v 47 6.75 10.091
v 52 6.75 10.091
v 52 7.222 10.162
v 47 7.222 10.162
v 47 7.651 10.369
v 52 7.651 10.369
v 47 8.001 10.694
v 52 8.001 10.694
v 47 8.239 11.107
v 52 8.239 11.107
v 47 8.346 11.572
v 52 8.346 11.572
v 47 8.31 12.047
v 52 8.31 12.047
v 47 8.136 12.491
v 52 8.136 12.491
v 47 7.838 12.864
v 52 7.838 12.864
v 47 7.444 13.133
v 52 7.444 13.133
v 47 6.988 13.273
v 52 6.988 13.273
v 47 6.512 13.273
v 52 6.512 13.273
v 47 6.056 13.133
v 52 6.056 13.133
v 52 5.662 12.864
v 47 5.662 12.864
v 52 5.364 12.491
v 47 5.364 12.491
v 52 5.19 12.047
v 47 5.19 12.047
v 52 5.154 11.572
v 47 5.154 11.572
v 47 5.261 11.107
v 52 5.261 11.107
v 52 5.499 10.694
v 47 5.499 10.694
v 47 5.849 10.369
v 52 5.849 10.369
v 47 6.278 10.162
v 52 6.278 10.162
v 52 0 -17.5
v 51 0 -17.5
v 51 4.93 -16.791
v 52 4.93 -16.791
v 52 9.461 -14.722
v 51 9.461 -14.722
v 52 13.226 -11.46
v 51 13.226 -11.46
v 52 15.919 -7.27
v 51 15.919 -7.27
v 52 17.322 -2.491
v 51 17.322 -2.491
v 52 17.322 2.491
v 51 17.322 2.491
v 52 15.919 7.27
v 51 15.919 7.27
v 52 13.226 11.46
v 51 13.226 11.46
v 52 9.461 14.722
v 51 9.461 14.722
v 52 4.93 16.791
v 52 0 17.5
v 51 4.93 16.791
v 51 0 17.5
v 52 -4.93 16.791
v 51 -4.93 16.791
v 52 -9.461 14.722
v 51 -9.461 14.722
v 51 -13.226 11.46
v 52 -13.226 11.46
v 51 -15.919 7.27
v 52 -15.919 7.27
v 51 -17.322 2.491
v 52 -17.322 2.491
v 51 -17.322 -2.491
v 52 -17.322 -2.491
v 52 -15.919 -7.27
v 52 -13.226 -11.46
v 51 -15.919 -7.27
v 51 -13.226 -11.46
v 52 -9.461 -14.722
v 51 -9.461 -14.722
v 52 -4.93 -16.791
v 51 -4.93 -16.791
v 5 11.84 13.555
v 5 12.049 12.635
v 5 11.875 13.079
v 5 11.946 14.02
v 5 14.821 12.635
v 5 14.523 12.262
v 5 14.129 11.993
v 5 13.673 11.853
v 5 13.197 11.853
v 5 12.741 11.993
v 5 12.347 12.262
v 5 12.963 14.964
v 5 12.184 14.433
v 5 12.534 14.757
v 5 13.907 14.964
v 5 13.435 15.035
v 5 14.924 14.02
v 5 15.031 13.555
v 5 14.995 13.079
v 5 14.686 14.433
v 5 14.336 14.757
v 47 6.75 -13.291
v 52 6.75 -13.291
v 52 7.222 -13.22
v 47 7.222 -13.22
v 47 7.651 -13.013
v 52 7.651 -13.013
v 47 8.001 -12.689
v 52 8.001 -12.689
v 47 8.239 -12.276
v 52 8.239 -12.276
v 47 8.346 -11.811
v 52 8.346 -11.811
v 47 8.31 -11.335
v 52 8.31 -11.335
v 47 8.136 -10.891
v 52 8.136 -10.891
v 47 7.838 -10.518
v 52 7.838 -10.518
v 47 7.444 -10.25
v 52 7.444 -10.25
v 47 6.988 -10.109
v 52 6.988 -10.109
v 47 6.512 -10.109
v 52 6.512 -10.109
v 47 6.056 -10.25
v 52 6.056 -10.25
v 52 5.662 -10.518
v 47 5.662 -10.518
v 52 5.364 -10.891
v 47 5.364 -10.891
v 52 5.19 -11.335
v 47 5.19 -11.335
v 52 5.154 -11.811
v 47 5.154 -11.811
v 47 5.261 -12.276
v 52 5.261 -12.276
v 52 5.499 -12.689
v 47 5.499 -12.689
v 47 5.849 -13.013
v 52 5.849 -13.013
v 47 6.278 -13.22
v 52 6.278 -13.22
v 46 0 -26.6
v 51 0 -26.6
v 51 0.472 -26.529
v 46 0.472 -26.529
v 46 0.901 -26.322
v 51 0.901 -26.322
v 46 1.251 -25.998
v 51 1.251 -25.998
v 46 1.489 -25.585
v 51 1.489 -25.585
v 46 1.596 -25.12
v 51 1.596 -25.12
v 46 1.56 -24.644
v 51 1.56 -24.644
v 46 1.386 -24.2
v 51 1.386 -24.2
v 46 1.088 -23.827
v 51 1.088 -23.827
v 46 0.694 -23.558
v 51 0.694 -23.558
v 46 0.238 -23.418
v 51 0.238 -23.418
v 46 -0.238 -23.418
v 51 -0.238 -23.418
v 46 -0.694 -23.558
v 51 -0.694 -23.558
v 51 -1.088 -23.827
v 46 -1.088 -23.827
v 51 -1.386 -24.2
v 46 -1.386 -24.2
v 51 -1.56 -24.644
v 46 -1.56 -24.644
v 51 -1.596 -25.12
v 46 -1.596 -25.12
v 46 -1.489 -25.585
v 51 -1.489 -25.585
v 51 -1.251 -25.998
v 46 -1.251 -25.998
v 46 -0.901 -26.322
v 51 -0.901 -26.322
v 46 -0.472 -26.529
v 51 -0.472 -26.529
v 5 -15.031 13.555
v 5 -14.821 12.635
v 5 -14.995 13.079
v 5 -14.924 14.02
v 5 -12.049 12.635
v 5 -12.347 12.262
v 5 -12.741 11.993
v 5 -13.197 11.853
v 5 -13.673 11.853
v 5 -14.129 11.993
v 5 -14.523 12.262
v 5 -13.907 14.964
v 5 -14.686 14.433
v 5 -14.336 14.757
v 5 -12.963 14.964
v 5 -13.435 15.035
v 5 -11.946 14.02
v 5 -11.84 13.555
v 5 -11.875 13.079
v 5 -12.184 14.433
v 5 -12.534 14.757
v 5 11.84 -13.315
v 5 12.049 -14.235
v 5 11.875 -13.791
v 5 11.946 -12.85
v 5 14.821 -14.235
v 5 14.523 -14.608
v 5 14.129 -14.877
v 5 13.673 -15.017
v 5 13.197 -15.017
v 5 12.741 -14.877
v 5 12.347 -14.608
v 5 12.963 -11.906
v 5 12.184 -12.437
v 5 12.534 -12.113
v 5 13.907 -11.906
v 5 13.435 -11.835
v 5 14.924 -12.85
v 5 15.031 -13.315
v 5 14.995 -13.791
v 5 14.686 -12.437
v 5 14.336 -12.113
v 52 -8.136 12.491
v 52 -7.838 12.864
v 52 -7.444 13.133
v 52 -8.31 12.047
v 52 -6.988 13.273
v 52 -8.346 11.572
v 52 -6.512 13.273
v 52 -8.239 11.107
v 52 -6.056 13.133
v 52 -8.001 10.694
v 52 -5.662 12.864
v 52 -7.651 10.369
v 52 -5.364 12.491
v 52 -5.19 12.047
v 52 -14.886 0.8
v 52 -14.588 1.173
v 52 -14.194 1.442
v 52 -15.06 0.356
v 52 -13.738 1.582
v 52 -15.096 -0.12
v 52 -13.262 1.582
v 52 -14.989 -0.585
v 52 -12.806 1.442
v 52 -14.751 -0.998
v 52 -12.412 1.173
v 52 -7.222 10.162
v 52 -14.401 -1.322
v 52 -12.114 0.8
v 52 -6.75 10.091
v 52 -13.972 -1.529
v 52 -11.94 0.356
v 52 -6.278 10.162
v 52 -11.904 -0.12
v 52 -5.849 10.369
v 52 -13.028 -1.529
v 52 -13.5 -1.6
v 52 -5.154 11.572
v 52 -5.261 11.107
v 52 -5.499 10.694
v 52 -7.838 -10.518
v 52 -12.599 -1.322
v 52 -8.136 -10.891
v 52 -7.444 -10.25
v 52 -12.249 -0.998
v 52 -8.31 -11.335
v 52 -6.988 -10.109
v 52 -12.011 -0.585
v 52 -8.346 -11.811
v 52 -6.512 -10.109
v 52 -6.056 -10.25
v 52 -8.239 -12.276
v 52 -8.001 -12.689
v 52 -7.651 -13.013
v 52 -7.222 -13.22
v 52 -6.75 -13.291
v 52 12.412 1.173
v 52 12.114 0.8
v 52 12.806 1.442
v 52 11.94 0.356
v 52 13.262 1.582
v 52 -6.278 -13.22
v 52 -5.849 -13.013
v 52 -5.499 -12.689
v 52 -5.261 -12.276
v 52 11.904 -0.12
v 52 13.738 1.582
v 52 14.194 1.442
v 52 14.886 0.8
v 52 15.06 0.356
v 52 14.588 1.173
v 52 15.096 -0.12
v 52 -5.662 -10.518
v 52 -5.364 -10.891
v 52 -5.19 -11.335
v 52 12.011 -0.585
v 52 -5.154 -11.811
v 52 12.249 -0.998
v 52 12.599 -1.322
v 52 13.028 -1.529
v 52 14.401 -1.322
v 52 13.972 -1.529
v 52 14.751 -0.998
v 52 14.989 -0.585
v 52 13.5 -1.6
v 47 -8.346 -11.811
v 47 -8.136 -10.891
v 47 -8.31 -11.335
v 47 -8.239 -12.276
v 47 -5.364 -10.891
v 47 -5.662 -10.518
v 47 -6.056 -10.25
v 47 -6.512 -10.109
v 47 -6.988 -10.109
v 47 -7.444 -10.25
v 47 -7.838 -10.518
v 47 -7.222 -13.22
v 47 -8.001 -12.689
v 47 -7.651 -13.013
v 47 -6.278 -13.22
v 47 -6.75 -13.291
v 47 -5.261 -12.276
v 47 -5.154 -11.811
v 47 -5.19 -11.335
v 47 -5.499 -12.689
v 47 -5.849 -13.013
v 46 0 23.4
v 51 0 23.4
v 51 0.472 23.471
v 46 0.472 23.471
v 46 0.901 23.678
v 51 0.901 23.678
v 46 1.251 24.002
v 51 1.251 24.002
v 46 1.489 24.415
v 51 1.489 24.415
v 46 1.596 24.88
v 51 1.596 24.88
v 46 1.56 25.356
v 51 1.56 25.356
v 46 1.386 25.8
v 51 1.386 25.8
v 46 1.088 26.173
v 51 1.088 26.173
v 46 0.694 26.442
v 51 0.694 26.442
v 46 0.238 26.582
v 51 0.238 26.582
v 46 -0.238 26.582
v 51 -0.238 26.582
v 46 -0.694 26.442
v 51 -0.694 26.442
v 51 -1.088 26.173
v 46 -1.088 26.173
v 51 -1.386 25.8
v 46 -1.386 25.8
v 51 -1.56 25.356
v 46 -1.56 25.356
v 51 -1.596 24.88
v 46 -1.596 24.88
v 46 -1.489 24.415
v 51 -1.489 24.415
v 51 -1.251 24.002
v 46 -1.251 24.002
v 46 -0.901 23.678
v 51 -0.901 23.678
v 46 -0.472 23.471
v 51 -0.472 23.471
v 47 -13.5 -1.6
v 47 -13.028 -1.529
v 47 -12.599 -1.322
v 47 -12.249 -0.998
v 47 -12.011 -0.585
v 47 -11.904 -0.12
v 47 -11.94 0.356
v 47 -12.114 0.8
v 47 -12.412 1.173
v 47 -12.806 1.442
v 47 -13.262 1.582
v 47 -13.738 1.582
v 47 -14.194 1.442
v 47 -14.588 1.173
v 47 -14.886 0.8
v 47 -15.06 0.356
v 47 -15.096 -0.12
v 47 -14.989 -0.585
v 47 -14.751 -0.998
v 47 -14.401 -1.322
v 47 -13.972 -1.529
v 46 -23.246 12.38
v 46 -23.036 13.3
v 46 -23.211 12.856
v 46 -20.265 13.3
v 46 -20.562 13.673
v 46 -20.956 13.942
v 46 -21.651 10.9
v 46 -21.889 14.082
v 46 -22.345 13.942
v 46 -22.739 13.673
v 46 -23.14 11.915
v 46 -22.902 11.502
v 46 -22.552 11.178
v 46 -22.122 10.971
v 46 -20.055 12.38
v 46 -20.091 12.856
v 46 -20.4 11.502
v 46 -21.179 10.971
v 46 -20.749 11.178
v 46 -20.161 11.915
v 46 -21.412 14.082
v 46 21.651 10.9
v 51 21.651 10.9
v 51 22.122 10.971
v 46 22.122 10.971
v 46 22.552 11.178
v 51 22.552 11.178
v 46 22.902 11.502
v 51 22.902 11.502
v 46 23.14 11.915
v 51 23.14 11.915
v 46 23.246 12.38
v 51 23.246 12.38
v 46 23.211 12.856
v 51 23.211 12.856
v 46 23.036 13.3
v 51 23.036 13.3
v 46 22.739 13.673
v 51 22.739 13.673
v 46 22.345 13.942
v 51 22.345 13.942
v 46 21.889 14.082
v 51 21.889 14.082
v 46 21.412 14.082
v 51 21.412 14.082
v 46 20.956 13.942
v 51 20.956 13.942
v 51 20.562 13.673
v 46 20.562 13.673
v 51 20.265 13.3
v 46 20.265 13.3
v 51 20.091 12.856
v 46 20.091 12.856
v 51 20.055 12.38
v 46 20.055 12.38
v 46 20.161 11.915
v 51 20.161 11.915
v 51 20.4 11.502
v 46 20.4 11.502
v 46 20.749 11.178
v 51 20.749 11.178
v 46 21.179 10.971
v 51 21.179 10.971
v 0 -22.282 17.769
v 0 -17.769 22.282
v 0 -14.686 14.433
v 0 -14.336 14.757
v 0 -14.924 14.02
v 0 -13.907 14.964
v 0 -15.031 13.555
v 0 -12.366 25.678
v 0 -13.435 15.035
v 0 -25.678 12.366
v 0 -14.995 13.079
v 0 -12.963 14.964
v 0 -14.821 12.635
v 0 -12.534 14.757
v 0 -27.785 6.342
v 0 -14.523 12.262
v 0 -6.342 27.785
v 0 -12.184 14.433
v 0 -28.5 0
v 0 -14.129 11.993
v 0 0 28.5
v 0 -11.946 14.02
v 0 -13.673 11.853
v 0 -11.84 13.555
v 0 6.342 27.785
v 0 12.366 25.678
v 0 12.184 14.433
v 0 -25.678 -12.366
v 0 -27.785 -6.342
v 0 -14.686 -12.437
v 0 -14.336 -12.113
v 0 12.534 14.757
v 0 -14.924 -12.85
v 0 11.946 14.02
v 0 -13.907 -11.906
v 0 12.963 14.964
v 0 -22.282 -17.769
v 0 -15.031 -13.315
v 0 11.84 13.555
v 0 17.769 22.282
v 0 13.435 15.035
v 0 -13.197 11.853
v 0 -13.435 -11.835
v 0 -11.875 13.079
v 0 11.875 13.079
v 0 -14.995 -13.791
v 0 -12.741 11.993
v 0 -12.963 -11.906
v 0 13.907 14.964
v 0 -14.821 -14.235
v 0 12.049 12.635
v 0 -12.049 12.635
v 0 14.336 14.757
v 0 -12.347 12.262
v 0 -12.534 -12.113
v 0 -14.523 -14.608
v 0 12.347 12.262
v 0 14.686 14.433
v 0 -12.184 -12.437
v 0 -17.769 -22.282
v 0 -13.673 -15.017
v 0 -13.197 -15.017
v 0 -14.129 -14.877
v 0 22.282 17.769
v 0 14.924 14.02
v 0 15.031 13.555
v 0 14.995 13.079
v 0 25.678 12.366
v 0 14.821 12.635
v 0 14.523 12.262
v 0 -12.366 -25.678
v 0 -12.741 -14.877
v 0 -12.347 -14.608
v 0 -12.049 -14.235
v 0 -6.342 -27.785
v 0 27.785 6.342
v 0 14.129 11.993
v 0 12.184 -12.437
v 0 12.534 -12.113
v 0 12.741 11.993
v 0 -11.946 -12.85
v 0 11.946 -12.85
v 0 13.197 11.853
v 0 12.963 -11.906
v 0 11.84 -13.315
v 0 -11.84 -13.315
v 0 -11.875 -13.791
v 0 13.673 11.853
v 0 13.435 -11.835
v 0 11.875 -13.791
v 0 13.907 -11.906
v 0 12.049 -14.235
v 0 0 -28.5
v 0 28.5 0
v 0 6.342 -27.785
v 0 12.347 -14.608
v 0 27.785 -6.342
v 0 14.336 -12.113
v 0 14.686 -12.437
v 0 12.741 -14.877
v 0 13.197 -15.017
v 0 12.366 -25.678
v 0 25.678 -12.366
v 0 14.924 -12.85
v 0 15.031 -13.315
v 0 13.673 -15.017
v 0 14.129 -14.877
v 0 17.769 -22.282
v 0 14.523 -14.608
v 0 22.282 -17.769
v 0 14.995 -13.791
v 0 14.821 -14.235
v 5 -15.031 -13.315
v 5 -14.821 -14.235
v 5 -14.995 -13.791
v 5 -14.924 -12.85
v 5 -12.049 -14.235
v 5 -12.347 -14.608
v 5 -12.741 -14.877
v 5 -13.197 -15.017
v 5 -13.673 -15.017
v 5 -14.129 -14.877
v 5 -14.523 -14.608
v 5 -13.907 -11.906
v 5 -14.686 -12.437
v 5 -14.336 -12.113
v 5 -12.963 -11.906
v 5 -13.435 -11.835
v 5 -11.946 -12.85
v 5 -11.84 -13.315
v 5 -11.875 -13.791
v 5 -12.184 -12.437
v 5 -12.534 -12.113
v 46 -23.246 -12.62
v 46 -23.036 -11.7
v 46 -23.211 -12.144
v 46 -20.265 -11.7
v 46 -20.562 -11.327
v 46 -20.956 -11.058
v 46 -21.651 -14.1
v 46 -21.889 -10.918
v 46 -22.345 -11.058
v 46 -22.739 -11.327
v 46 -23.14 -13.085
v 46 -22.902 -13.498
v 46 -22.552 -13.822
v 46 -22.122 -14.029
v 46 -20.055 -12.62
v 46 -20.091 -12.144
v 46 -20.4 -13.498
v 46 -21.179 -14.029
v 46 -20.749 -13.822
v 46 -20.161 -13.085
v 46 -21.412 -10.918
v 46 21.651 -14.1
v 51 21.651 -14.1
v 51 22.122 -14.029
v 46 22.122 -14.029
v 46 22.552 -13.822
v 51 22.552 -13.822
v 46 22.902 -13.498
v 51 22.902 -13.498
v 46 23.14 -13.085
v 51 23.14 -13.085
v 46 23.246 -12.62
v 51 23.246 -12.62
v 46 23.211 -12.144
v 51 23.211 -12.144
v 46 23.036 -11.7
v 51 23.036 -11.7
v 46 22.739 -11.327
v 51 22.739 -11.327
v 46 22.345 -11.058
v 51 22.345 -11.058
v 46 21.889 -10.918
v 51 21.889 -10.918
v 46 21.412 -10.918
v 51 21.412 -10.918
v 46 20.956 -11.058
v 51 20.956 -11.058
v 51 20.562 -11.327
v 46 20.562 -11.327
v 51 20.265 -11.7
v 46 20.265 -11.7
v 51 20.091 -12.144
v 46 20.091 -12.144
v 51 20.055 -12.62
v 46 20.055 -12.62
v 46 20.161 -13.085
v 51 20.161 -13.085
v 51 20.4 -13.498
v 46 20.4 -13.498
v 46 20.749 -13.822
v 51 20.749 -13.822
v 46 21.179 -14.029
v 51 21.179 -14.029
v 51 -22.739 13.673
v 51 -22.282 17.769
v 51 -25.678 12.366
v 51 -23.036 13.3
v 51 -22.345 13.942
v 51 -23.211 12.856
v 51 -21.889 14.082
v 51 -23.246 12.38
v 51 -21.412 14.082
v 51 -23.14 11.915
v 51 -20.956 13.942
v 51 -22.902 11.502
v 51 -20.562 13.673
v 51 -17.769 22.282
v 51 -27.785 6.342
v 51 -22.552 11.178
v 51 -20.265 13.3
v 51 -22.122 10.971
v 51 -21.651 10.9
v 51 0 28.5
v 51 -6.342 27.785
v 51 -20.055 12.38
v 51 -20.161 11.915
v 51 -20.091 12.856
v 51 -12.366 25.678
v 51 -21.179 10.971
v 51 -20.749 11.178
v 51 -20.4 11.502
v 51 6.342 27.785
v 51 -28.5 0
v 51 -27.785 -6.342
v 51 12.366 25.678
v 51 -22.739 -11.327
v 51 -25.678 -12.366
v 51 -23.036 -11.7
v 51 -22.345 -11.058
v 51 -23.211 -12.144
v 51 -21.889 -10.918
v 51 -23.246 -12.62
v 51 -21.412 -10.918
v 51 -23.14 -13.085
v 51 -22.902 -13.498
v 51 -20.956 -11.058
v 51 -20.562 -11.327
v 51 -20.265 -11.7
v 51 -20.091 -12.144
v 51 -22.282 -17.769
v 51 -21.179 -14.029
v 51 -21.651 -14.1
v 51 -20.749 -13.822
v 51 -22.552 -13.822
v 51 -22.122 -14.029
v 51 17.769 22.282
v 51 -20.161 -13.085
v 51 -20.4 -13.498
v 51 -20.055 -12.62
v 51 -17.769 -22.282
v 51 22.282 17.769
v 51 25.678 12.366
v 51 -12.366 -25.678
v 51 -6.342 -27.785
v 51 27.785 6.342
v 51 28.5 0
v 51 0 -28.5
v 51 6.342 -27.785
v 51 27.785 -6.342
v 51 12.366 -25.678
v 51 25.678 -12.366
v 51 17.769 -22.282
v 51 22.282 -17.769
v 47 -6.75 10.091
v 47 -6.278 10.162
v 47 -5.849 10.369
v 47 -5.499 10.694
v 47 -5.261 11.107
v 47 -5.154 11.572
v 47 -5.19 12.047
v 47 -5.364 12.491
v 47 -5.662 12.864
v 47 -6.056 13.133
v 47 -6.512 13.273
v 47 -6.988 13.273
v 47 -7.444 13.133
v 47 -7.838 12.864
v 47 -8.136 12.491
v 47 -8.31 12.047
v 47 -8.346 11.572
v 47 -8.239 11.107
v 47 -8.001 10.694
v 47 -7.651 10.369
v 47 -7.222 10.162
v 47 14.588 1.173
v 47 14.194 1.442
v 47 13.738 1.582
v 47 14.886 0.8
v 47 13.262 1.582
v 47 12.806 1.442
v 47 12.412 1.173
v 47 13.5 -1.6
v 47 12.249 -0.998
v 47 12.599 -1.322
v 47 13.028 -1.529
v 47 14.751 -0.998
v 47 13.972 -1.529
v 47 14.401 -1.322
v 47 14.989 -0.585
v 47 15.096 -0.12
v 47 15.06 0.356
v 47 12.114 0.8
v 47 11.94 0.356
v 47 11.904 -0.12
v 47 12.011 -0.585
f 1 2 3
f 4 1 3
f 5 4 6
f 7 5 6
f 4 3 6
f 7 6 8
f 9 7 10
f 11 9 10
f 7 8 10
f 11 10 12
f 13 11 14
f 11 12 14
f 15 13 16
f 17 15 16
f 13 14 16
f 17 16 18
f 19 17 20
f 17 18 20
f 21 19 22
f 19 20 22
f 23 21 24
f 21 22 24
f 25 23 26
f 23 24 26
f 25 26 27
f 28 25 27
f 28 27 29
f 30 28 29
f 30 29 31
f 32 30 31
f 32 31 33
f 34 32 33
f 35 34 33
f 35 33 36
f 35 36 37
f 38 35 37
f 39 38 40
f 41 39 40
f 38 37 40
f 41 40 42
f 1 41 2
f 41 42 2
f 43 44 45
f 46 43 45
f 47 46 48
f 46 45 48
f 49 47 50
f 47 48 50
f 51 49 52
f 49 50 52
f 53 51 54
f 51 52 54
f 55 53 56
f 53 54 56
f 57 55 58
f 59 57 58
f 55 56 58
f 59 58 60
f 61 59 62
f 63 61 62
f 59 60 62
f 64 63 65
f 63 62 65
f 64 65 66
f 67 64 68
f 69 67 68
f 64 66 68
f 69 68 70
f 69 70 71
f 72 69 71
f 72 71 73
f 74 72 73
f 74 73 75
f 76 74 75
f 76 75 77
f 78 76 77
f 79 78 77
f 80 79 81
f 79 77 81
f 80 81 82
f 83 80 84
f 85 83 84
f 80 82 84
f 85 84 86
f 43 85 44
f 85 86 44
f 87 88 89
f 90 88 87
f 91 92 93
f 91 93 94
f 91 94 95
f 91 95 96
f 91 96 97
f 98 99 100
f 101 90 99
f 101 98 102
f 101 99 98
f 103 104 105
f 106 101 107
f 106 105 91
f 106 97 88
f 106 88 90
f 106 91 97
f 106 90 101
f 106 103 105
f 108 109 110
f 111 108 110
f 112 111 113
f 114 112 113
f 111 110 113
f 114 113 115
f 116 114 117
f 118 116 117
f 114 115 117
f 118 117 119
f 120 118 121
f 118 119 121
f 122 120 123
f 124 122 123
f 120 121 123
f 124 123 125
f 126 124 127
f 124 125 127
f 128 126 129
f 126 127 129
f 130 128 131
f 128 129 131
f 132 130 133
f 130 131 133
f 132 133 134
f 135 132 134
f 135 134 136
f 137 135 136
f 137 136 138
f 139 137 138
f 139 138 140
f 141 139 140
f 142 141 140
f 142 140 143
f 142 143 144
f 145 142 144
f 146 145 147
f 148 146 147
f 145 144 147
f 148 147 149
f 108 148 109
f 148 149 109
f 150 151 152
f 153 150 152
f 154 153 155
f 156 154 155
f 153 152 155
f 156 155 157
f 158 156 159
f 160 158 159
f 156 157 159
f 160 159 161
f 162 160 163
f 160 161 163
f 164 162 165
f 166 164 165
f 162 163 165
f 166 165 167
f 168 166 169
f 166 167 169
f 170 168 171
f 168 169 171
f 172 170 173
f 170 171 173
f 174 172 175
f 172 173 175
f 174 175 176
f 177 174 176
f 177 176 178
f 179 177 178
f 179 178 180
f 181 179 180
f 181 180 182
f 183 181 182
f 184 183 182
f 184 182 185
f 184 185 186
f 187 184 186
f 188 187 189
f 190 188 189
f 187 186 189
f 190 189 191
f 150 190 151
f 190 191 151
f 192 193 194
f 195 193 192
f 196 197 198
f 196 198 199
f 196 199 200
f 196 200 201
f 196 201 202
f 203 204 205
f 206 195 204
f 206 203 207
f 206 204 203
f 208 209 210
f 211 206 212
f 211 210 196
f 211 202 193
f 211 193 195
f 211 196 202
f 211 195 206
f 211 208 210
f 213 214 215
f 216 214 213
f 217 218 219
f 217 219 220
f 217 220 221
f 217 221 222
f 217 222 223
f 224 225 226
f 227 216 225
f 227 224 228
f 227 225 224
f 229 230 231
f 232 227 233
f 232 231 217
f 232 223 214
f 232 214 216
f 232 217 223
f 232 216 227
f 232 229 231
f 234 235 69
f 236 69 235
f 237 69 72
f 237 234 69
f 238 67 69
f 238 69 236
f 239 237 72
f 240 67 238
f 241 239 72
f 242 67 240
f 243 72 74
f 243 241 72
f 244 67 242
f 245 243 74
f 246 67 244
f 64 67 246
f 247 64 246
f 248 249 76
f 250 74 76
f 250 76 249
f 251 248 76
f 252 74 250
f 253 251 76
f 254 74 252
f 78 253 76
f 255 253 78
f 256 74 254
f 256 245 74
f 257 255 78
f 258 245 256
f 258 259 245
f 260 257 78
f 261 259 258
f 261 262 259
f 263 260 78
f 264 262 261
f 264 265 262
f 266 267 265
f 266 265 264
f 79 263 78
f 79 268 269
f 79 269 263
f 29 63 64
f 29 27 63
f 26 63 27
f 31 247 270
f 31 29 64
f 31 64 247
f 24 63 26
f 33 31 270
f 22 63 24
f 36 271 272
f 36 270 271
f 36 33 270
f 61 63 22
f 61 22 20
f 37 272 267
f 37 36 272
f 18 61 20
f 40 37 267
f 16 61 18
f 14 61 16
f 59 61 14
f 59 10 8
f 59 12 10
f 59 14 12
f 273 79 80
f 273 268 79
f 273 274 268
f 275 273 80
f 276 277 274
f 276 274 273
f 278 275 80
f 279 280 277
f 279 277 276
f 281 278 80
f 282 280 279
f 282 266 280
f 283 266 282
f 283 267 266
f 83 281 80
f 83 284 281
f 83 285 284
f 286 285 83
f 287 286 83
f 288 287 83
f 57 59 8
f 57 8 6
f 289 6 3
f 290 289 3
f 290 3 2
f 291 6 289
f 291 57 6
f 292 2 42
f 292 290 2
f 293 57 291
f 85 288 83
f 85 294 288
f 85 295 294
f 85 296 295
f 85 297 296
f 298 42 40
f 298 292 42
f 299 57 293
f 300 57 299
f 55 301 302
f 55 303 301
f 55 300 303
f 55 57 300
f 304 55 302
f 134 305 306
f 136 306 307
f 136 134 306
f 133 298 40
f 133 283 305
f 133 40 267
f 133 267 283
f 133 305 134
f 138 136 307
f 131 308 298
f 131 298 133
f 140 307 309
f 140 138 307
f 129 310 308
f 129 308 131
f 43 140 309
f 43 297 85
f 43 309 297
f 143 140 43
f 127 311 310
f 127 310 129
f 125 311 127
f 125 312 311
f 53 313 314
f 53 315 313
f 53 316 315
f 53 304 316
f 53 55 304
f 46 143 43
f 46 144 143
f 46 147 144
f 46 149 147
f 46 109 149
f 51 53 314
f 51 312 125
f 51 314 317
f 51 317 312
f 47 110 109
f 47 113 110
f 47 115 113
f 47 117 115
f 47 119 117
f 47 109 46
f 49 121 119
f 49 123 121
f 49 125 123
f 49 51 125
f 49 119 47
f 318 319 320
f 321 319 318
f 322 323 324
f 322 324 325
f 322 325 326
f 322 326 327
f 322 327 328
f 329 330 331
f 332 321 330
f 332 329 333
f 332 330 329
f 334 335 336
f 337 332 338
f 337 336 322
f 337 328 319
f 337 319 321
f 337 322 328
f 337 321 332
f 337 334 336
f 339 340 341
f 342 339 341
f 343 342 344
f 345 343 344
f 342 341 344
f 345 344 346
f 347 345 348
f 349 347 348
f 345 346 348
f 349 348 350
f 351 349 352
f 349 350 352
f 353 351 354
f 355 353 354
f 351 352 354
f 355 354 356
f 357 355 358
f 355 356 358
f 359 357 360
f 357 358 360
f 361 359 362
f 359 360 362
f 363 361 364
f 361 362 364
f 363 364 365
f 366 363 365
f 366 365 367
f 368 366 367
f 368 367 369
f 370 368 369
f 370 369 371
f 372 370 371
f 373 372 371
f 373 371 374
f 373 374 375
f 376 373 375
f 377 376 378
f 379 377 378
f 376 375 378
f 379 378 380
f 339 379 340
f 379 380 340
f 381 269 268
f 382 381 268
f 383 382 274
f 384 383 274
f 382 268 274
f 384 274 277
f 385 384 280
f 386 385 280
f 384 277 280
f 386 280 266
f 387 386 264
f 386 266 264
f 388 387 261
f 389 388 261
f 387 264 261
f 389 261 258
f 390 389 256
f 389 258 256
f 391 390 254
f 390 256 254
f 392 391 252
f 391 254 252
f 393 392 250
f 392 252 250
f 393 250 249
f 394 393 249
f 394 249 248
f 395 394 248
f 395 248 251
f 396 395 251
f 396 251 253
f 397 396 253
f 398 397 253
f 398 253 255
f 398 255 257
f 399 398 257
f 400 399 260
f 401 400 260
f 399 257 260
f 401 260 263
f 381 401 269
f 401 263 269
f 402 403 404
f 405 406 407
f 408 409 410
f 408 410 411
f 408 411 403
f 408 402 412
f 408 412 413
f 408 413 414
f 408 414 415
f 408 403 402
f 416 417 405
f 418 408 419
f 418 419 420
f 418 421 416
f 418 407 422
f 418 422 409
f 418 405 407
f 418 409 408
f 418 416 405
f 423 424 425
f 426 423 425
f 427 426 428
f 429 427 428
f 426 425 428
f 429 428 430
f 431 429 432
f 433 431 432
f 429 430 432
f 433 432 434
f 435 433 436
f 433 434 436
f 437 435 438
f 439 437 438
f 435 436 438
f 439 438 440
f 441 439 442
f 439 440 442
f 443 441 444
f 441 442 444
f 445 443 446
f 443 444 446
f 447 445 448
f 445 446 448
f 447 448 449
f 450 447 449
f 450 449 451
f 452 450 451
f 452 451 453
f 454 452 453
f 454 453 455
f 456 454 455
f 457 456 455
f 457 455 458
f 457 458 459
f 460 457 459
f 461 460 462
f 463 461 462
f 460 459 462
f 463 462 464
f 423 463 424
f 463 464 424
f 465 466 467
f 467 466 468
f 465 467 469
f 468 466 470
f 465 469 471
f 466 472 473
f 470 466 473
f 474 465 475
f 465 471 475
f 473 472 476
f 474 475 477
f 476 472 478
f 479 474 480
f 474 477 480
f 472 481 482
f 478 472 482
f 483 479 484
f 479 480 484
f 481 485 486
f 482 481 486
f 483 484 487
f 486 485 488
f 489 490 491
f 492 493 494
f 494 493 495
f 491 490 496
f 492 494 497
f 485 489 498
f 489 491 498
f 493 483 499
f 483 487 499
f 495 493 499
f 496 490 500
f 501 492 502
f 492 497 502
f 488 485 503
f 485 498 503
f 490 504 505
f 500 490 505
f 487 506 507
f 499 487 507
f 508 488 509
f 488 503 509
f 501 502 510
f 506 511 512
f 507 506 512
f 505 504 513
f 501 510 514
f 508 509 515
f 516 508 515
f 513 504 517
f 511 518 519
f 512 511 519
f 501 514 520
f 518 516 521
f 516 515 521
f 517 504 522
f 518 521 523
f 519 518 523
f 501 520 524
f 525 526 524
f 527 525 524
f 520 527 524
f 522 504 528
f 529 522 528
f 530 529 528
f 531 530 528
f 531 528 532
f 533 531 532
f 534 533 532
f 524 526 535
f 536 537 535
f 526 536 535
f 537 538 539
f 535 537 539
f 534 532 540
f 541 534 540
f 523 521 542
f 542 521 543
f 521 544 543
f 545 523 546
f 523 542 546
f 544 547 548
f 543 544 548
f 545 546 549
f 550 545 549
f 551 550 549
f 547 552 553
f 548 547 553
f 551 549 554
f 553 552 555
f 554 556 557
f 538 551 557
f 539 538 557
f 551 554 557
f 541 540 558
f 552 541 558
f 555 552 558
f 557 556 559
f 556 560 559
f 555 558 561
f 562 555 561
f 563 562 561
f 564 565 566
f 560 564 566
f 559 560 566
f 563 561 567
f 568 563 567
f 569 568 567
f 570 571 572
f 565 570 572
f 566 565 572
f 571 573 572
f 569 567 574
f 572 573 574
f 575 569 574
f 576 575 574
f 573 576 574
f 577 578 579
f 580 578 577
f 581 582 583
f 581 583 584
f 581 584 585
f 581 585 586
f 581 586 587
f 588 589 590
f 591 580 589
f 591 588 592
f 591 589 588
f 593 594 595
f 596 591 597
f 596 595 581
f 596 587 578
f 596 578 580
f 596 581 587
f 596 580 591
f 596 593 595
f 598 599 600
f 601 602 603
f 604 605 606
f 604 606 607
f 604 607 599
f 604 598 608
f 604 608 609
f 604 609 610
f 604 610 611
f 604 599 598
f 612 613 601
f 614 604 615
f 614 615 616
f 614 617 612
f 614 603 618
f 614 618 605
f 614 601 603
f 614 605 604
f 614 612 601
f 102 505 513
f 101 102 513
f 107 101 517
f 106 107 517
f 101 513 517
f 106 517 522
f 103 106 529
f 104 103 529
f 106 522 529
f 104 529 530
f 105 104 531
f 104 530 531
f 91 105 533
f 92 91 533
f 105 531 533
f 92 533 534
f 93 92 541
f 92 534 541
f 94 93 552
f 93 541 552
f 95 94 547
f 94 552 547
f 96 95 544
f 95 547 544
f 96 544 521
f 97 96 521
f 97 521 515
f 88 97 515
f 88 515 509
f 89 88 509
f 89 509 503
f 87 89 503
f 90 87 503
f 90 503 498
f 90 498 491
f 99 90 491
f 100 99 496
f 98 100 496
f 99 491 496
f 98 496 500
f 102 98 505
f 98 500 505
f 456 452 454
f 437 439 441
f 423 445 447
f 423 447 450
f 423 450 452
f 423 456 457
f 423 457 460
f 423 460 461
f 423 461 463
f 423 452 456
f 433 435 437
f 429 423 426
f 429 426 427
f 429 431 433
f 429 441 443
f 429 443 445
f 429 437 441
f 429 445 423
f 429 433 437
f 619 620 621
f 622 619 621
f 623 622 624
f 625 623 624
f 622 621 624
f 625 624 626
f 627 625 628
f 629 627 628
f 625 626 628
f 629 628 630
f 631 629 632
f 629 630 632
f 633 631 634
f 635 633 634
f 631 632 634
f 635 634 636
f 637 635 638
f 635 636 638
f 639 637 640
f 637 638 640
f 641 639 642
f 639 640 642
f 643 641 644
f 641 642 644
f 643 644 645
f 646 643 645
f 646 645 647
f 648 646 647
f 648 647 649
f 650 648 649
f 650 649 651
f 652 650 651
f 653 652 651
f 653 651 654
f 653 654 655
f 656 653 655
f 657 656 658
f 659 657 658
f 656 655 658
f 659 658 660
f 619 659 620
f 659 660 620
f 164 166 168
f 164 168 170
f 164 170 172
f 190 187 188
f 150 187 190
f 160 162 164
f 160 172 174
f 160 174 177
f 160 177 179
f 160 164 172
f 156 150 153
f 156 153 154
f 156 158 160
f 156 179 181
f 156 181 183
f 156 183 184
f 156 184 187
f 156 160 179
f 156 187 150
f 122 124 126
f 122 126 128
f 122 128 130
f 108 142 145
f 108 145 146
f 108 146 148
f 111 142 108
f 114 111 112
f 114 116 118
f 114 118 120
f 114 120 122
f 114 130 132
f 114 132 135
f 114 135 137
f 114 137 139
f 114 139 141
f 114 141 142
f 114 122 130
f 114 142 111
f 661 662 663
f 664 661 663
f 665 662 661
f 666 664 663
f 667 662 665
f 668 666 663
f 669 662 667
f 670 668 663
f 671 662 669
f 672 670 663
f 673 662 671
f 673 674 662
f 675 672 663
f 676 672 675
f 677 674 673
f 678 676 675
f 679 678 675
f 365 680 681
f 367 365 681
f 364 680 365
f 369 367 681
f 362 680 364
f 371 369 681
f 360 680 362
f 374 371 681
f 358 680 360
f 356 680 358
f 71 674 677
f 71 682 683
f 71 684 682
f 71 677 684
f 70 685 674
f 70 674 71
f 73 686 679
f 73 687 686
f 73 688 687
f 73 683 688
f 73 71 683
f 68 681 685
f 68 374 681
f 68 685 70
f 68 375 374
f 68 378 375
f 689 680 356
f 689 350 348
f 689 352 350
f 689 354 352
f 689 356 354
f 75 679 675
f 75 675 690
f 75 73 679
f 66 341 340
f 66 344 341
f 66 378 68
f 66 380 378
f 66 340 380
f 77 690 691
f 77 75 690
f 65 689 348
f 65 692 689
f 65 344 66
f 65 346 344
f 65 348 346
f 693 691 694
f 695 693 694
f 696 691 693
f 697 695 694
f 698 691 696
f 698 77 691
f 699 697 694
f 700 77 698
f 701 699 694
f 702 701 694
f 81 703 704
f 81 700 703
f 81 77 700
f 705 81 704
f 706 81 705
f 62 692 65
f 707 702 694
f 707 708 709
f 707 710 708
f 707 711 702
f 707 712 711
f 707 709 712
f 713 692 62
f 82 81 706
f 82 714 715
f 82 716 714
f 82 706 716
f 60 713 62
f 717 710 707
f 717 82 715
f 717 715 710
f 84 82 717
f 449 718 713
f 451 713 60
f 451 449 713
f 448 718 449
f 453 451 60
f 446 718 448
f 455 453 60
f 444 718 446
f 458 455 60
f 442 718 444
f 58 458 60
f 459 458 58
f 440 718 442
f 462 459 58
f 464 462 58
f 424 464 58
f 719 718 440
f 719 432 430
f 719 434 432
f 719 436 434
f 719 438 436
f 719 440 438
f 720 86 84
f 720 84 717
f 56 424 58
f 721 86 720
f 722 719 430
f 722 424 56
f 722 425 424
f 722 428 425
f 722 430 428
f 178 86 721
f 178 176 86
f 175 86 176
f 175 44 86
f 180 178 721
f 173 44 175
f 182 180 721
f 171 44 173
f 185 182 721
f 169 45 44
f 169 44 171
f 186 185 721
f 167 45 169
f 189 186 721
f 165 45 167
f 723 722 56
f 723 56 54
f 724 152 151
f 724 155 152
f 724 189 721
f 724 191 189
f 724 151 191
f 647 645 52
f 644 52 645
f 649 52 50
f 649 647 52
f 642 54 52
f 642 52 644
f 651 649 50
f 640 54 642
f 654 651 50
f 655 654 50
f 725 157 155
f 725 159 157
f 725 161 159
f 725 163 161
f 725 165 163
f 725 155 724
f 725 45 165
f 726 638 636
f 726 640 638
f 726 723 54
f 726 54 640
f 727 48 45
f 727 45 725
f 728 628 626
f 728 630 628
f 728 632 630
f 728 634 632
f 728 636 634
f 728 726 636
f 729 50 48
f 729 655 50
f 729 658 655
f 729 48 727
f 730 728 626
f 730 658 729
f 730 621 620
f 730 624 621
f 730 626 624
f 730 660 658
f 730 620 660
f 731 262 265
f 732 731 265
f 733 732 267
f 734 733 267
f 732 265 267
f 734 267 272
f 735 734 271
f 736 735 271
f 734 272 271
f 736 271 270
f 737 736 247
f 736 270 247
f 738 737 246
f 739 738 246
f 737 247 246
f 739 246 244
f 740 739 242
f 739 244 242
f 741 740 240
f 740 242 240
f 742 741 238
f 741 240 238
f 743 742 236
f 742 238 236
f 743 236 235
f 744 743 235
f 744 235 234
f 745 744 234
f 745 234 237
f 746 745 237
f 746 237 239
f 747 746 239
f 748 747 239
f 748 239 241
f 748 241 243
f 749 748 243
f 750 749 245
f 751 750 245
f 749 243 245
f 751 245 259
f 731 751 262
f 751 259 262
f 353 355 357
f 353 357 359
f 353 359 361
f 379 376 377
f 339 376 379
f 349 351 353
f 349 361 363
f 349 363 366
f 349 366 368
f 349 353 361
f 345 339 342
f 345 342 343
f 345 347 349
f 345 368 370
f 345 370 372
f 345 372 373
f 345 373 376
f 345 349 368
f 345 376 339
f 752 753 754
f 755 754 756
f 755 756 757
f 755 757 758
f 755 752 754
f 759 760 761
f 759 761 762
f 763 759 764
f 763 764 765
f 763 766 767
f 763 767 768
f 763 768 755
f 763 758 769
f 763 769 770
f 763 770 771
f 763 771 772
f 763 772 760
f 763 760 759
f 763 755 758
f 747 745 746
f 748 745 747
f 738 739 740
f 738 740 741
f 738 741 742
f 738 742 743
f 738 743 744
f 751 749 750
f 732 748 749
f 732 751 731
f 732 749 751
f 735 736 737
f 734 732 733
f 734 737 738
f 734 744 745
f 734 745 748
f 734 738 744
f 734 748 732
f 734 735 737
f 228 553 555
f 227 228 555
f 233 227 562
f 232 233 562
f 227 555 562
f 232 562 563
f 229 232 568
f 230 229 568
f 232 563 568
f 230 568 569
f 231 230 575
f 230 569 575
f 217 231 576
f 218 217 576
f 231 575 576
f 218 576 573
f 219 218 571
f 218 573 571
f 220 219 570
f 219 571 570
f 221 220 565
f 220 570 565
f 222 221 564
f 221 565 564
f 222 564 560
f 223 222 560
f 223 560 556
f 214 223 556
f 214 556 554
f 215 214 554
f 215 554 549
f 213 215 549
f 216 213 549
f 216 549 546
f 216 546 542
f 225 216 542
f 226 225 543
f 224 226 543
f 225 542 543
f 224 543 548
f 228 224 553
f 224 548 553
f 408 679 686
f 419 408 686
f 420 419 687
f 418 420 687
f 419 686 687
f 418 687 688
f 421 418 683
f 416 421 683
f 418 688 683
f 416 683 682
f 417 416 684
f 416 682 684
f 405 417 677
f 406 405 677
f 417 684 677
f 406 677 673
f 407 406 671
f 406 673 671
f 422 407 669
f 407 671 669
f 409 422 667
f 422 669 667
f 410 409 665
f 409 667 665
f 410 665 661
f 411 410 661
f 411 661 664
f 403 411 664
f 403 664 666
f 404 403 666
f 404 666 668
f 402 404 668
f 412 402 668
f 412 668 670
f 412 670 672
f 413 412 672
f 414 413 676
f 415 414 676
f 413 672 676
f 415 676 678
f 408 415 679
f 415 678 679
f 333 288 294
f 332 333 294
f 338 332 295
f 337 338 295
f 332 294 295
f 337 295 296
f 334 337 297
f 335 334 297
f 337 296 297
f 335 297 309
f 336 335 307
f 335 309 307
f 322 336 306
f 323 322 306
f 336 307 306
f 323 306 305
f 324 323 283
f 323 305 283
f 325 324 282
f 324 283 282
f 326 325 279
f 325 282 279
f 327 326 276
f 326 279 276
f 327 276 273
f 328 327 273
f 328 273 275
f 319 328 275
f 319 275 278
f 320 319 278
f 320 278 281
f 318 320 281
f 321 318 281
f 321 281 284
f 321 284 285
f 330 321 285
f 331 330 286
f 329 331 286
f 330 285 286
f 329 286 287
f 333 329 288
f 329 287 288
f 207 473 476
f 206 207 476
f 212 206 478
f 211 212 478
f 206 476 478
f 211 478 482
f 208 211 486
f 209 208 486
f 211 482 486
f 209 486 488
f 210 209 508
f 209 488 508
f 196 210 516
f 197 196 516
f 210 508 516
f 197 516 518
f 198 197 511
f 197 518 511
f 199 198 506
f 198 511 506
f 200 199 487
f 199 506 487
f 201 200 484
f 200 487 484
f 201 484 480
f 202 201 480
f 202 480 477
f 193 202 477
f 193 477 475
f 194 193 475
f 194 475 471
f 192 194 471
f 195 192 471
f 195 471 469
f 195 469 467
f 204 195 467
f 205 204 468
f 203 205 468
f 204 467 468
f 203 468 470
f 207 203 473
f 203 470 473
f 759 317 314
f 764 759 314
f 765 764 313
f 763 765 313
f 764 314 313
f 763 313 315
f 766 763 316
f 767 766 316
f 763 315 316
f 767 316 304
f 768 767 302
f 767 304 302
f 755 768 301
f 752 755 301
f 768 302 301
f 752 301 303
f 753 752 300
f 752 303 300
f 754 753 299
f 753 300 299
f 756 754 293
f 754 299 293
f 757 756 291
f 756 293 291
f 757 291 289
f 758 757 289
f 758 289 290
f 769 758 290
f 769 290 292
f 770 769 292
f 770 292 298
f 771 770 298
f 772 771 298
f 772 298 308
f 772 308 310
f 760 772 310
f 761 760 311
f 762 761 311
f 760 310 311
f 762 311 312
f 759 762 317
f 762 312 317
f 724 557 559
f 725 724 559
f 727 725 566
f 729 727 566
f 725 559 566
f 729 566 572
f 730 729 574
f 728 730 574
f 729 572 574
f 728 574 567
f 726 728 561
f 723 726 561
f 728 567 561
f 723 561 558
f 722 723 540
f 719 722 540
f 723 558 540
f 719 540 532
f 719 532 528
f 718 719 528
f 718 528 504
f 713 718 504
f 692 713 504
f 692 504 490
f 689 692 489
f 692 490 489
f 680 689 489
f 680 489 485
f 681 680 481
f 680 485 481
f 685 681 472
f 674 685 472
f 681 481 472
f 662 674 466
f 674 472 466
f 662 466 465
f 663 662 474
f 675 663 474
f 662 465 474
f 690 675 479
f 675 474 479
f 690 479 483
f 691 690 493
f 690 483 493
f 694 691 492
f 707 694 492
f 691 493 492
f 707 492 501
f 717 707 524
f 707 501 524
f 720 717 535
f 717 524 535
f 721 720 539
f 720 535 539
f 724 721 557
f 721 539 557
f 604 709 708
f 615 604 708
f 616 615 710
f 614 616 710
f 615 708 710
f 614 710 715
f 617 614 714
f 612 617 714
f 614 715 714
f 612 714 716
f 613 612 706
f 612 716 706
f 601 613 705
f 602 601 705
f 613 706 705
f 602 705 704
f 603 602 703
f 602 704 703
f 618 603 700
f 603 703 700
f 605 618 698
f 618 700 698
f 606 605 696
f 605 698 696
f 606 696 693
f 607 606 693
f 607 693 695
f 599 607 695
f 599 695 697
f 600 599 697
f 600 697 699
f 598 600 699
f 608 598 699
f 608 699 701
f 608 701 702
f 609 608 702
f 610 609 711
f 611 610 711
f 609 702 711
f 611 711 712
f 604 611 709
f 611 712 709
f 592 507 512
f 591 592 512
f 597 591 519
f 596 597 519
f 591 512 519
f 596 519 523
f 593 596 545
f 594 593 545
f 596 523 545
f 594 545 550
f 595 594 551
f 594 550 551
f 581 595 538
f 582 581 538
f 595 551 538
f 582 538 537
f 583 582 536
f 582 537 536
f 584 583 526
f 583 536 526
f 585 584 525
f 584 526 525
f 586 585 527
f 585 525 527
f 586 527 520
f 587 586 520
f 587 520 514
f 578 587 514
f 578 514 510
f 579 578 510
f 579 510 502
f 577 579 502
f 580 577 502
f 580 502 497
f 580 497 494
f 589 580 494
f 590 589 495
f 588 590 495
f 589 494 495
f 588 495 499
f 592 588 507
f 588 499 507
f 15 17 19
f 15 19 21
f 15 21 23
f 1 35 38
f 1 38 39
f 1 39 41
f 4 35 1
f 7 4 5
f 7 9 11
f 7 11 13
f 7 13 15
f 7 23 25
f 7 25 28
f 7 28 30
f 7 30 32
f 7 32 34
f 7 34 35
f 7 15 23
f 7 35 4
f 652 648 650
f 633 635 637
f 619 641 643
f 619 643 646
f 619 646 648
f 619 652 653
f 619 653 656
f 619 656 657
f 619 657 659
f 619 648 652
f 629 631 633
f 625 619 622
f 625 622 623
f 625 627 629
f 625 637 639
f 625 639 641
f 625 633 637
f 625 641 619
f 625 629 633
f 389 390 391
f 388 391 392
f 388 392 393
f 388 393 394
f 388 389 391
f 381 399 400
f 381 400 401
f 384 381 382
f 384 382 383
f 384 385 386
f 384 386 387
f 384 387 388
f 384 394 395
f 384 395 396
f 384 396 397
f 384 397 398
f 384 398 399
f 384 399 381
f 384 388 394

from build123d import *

# Parameters (mm, degrees)
SKETCH_1_R          = 28.5
EXTRUDE_1_DEPTH     = 51
SKETCH_2_R          = 17.5
EXTRUDE_2_DEPTH     = 1
SKETCH_3_R          = 1.6
CUT_EXTRUDE_1_DEPTH = 5
SKETCH_4_R          = 1.6
CUT_EXTRUDE_2_DEPTH = 5
SKETCH_5_R          = 1.6
CUT_EXTRUDE_3_DEPTH = 5


with BuildPart() as part:
    # 草图1 → 凸台-拉伸1 (new body)
    with BuildSketch(Plane(origin=(0, 0, 0), x_dir=(0, 0, -1), z_dir=(1, 0, 0))):
        Circle(SKETCH_1_R)
    extrude(amount=EXTRUDE_1_DEPTH)

    # 草图2 → 凸台-拉伸2 (add)
    with BuildSketch(Plane(origin=(51, 0, 0), x_dir=(0, 0, -1), z_dir=(1, 0, 0))):
        Circle(SKETCH_2_R)
    extrude(amount=EXTRUDE_2_DEPTH)

    # 草图3 → 切除-拉伸1 (cut)
    with BuildSketch(Plane.ZY):
        with Locations((13.435028843, 13.435028843)):
            Circle(SKETCH_3_R)
        with Locations((13.435028843, -13.435028843)):
            Circle(SKETCH_3_R)
        with Locations((-13.435028843, -13.435028843)):
            Circle(SKETCH_3_R)
        with Locations((-13.435028843, 13.435028843)):
            Circle(SKETCH_3_R)
    extrude(amount=-CUT_EXTRUDE_1_DEPTH, mode=Mode.SUBTRACT)

    # 草图4 → 切除-拉伸2 (cut)
    with BuildSketch(Plane(origin=(51, 0, 0), x_dir=(0, 0, -1), z_dir=(1, 0, 0))):
        with Locations((-12.5, 21.650635095)):
            Circle(SKETCH_4_R)
        with Locations((12.5, 21.650635095)):
            Circle(SKETCH_4_R)
        with Locations((25, 0)):
            Circle(SKETCH_4_R)
        with Locations((12.5, -21.650635095)):
            Circle(SKETCH_4_R)
        with Locations((-12.5, -21.650635095)):
            Circle(SKETCH_4_R)
        with Locations((-25, 0)):
            Circle(SKETCH_4_R)
    extrude(amount=-CUT_EXTRUDE_2_DEPTH, mode=Mode.SUBTRACT)

    # 草图5 → 切除-拉伸3 (cut)
    with BuildSketch(Plane(origin=(52, 0, 0), x_dir=(0, 0, -1), z_dir=(1, 0, 0))):
        with Locations((0, 13.5)):
            Circle(SKETCH_5_R)
        with Locations((11.691342951, 6.75)):
            Circle(SKETCH_5_R)
        with Locations((11.691342951, -6.75)):
            Circle(SKETCH_5_R)
        with Locations((0, -13.5)):
            Circle(SKETCH_5_R)
        with Locations((-11.691342951, -6.75)):
            Circle(SKETCH_5_R)
        with Locations((-11.691342951, 6.75)):
            Circle(SKETCH_5_R)
    extrude(amount=-CUT_EXTRUDE_3_DEPTH, mode=Mode.SUBTRACT)


solid = part.part
